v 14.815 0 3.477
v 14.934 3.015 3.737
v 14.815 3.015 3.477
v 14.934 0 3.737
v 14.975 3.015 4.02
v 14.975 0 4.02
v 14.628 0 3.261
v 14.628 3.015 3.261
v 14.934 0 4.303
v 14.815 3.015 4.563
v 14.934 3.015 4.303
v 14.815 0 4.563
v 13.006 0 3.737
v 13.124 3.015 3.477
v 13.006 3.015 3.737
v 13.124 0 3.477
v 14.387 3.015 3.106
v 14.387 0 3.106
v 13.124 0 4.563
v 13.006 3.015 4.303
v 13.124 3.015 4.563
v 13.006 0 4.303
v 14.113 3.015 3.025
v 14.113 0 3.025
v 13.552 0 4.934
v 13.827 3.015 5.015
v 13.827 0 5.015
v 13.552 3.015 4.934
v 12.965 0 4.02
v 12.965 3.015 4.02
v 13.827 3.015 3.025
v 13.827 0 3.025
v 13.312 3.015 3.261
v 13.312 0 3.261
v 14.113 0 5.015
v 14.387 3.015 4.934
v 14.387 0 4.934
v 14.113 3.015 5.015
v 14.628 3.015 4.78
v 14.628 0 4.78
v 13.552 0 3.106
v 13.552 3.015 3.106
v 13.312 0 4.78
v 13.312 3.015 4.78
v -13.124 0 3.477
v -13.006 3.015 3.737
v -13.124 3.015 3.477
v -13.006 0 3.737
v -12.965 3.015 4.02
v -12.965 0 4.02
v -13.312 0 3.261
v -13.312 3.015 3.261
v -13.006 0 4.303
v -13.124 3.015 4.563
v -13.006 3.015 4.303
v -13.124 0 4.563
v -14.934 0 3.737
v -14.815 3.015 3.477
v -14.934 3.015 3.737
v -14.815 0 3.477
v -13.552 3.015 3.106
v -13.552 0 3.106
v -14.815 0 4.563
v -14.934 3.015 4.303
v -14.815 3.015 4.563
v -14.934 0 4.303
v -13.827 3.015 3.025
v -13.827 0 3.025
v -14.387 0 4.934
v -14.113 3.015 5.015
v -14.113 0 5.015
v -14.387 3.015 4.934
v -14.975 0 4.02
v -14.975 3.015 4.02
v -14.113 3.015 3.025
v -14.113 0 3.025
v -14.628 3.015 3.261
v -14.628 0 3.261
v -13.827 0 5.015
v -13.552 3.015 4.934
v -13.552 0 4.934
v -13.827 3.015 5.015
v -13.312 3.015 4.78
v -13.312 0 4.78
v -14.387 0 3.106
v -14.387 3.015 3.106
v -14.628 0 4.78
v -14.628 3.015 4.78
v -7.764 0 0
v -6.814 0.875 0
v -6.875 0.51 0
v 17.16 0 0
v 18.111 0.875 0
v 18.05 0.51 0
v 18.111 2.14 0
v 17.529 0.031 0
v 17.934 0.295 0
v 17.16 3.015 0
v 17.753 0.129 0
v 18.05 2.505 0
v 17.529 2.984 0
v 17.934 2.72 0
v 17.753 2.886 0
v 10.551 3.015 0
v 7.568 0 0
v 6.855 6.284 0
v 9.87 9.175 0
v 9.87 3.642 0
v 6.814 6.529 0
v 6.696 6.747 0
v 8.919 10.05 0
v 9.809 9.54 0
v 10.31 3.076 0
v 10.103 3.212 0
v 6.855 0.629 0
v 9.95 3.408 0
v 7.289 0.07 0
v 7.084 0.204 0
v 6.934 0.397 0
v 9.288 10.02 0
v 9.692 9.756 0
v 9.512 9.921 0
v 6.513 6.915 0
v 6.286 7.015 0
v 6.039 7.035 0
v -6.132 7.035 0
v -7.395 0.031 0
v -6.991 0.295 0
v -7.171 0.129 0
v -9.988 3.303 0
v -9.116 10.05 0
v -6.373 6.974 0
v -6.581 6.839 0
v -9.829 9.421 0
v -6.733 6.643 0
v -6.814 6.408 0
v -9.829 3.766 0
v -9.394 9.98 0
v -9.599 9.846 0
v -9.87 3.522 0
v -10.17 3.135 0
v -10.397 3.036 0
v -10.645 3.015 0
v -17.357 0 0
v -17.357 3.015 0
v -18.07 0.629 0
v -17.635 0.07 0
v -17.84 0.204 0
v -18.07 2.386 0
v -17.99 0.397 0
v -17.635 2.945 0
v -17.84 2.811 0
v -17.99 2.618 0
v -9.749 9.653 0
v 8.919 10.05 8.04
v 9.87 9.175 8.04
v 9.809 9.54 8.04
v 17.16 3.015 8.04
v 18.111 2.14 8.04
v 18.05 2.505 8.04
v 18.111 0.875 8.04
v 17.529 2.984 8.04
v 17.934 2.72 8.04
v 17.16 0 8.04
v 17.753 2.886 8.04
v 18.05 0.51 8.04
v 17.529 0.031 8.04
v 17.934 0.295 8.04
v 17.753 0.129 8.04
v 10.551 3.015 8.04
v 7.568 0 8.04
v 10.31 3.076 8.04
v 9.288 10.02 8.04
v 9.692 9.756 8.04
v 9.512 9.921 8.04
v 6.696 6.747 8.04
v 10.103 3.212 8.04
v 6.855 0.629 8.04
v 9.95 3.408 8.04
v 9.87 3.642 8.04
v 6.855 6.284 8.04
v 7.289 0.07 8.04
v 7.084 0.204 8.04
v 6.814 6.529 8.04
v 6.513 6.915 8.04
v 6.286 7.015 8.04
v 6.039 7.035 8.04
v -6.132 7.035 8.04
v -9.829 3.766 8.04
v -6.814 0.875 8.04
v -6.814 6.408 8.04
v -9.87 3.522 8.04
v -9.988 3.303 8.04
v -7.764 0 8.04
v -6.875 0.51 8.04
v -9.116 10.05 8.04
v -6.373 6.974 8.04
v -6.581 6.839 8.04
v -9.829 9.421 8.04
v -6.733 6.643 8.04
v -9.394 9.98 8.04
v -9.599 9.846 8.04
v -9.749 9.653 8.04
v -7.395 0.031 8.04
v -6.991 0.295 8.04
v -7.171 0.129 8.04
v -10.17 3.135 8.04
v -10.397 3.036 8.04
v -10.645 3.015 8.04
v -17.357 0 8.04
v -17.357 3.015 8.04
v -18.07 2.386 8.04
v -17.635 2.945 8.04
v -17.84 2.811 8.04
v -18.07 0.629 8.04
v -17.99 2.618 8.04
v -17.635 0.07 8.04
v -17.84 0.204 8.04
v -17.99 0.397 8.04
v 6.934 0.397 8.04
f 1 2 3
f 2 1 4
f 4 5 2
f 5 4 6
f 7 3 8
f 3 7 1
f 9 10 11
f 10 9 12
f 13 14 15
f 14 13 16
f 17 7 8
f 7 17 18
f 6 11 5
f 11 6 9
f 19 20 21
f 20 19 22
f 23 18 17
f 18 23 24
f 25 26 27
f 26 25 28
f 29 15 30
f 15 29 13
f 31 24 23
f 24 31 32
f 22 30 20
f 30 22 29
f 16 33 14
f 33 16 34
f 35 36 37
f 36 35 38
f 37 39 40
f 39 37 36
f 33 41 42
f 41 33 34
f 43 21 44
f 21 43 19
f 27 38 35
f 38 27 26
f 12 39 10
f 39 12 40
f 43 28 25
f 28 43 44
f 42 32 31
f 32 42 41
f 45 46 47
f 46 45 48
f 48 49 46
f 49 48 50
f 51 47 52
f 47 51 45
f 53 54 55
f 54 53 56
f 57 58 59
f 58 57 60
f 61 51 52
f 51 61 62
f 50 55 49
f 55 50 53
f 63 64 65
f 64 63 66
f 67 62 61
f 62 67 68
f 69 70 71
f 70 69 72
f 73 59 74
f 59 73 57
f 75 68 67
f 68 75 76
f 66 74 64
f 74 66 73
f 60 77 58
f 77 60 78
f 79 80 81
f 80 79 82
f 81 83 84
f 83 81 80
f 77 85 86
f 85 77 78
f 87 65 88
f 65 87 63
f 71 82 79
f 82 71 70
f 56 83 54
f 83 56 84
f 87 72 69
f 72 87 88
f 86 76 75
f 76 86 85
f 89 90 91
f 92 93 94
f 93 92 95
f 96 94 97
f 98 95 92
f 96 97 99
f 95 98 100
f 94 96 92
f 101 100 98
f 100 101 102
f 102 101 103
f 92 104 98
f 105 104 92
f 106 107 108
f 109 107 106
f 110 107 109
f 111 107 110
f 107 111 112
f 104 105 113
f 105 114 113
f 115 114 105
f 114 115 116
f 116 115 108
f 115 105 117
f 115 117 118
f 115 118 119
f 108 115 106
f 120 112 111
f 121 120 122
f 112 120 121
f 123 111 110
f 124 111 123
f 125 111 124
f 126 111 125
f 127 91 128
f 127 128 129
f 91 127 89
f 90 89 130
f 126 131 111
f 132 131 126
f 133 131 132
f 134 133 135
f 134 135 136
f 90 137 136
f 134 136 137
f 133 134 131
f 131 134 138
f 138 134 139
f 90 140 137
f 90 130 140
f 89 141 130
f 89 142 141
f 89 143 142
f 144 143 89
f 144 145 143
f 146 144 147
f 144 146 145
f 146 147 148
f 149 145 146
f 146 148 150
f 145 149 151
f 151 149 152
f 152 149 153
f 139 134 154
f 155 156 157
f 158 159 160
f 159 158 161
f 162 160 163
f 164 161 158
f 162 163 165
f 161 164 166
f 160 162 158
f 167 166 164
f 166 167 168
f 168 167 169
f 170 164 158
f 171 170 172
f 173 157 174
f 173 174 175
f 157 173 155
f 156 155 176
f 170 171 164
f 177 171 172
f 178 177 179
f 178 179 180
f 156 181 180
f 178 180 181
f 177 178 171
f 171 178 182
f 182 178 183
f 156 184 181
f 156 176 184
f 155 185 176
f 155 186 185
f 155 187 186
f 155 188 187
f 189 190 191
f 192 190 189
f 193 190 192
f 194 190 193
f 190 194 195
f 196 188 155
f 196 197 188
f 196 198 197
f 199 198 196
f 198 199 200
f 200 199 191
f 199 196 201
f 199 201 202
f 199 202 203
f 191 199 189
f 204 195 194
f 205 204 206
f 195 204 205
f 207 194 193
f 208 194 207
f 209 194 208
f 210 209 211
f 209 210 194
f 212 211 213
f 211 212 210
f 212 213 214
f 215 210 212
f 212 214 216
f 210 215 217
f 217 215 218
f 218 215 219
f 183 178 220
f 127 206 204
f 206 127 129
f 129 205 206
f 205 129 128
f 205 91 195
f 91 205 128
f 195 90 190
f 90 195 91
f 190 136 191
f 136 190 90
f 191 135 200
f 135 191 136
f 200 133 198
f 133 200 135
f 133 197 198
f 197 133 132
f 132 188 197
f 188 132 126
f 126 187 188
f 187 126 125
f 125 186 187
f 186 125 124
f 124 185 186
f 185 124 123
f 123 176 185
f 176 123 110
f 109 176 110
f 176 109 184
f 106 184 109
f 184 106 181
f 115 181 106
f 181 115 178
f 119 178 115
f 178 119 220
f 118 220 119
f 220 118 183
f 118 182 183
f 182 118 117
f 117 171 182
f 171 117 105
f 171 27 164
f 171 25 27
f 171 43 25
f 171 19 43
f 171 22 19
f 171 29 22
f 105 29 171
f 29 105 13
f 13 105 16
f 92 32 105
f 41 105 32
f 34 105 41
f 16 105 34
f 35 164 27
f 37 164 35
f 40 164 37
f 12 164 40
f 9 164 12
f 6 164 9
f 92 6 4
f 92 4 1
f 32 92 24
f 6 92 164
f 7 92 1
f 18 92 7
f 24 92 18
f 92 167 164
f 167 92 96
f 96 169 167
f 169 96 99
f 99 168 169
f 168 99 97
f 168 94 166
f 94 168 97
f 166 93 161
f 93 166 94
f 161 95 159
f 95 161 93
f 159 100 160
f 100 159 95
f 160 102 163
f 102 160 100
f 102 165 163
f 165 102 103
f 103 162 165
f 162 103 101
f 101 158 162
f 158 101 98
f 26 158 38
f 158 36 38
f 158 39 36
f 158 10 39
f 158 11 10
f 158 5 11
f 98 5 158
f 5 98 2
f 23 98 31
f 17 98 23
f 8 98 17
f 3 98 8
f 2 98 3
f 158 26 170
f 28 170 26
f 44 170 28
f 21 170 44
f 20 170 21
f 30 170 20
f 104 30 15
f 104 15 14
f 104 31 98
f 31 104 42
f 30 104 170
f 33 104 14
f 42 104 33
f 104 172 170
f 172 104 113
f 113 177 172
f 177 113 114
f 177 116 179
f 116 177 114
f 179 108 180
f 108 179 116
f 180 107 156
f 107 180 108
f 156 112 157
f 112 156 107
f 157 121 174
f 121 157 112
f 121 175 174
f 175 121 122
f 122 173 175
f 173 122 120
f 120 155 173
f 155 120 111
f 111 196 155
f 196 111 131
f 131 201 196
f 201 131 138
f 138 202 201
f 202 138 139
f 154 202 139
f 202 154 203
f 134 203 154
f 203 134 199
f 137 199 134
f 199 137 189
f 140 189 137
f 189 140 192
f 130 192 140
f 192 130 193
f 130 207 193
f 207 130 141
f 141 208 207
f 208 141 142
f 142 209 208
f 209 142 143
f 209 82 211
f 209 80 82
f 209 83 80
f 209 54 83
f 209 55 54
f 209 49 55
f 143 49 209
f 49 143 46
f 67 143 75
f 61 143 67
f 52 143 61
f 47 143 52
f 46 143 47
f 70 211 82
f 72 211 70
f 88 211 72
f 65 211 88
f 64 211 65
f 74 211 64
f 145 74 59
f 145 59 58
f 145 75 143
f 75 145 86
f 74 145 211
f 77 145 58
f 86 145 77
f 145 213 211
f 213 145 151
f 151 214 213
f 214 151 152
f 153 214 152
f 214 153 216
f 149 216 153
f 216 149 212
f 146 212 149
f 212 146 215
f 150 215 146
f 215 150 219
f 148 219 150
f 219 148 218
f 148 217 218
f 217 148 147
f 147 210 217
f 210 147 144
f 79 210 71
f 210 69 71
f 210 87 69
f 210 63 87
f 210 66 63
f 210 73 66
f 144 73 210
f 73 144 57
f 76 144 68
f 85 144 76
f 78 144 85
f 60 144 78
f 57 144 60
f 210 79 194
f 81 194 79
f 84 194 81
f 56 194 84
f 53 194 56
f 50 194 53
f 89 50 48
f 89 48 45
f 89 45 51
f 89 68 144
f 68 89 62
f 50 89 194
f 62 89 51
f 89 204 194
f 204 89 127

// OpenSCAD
//------------------------------------------------------------------
/*

LED Rope Light Bracket

*/
//------------------------------------------------------------------
/* [Global] */

/*[General]*/
internal_length = 13.6;
internal_height = 7;
bracket_width = 8;
wall_thickness = 3;
bracket_length = 36;
hole_diameter = 2;

/* [Hidden] */
//------------------------------------------------------------------
// Set the scaling value to compensate for print shrinkage

scale = 1/0.995; // ABS ~0.5% shrinkage
//scale = 1/0.998; // PLA ~0.2% shrinkage

function dim(x) = scale * x;

//------------------------------------------------------------------
// control the number of facets on cylinders

facet_epsilon = 0.01;
function facets(r) = 180 / acos(1 - (facet_epsilon / r));

// small tweak to avoid differencing artifacts
epsilon = 0.05;


//------------------------------------------------------------------
// derived values

internal_l = dim(internal_length);
internal_h = dim(internal_height);
bracket_w = dim(bracket_width);
bracket_l = dim(bracket_length);
wall_t = dim(wall_thickness);
hole_r = dim(hole_diameter/2);

//------------------------------------------------------------------
// rounded/filleted edges

module outset(d=1) {
  minkowski() {
    circle(r=d, $fn=facets(d));
    children(0);
  }
}

module inset(d=1) {
  render() inverse() outset(d=d) inverse() children(0);
}

module inverse() {
  difference() {
    square(1e5, center=true);
    children(0);
  }
}

module rounded(r=1) {
  outset(d=r) inset(d=r) children(0);
}

module filleted(r=1) {
  inset(d=r) render() outset(d=r) children(0);
}

//------------------------------------------------------------------

module hole() {
  translate([0,-epsilon,bracket_w/2]) rotate([-90,0,0]) {
    cylinder(r=hole_r, h=wall_t + (2 * epsilon), $fn=facets(hole_r));
  }
}

module holes() {
  d = ((bracket_l + internal_l) / 4) + (wall_t / 2);
  translate([d,0,0]) hole();
  translate([-d,0,0]) hole();
}

module bracket() {
  points = [
    [internal_l/2, internal_h],
    [internal_l/2, 0],
    [bracket_l/2, 0],
    [bracket_l/2, wall_t],
    [internal_l/2 + wall_t, wall_t],
    [internal_l/2 + wall_t, internal_h + wall_t],
    [-internal_l/2 - wall_t, internal_h + wall_t],
    [-internal_l/2 - wall_t, wall_t],
    [-bracket_l/2, wall_t],
    [-bracket_l/2, 0],
    [-internal_l/2, 0],
    [-internal_l/2, internal_h],
  ];
  linear_extrude(height=bracket_w, convexity=2) {
    filleted(0.25 * wall_t) rounded(0.25 * wall_t) polygon(points=points);
  }
}

difference() {
  bracket();
  holes();
}

//------------------------------------------------------------------
